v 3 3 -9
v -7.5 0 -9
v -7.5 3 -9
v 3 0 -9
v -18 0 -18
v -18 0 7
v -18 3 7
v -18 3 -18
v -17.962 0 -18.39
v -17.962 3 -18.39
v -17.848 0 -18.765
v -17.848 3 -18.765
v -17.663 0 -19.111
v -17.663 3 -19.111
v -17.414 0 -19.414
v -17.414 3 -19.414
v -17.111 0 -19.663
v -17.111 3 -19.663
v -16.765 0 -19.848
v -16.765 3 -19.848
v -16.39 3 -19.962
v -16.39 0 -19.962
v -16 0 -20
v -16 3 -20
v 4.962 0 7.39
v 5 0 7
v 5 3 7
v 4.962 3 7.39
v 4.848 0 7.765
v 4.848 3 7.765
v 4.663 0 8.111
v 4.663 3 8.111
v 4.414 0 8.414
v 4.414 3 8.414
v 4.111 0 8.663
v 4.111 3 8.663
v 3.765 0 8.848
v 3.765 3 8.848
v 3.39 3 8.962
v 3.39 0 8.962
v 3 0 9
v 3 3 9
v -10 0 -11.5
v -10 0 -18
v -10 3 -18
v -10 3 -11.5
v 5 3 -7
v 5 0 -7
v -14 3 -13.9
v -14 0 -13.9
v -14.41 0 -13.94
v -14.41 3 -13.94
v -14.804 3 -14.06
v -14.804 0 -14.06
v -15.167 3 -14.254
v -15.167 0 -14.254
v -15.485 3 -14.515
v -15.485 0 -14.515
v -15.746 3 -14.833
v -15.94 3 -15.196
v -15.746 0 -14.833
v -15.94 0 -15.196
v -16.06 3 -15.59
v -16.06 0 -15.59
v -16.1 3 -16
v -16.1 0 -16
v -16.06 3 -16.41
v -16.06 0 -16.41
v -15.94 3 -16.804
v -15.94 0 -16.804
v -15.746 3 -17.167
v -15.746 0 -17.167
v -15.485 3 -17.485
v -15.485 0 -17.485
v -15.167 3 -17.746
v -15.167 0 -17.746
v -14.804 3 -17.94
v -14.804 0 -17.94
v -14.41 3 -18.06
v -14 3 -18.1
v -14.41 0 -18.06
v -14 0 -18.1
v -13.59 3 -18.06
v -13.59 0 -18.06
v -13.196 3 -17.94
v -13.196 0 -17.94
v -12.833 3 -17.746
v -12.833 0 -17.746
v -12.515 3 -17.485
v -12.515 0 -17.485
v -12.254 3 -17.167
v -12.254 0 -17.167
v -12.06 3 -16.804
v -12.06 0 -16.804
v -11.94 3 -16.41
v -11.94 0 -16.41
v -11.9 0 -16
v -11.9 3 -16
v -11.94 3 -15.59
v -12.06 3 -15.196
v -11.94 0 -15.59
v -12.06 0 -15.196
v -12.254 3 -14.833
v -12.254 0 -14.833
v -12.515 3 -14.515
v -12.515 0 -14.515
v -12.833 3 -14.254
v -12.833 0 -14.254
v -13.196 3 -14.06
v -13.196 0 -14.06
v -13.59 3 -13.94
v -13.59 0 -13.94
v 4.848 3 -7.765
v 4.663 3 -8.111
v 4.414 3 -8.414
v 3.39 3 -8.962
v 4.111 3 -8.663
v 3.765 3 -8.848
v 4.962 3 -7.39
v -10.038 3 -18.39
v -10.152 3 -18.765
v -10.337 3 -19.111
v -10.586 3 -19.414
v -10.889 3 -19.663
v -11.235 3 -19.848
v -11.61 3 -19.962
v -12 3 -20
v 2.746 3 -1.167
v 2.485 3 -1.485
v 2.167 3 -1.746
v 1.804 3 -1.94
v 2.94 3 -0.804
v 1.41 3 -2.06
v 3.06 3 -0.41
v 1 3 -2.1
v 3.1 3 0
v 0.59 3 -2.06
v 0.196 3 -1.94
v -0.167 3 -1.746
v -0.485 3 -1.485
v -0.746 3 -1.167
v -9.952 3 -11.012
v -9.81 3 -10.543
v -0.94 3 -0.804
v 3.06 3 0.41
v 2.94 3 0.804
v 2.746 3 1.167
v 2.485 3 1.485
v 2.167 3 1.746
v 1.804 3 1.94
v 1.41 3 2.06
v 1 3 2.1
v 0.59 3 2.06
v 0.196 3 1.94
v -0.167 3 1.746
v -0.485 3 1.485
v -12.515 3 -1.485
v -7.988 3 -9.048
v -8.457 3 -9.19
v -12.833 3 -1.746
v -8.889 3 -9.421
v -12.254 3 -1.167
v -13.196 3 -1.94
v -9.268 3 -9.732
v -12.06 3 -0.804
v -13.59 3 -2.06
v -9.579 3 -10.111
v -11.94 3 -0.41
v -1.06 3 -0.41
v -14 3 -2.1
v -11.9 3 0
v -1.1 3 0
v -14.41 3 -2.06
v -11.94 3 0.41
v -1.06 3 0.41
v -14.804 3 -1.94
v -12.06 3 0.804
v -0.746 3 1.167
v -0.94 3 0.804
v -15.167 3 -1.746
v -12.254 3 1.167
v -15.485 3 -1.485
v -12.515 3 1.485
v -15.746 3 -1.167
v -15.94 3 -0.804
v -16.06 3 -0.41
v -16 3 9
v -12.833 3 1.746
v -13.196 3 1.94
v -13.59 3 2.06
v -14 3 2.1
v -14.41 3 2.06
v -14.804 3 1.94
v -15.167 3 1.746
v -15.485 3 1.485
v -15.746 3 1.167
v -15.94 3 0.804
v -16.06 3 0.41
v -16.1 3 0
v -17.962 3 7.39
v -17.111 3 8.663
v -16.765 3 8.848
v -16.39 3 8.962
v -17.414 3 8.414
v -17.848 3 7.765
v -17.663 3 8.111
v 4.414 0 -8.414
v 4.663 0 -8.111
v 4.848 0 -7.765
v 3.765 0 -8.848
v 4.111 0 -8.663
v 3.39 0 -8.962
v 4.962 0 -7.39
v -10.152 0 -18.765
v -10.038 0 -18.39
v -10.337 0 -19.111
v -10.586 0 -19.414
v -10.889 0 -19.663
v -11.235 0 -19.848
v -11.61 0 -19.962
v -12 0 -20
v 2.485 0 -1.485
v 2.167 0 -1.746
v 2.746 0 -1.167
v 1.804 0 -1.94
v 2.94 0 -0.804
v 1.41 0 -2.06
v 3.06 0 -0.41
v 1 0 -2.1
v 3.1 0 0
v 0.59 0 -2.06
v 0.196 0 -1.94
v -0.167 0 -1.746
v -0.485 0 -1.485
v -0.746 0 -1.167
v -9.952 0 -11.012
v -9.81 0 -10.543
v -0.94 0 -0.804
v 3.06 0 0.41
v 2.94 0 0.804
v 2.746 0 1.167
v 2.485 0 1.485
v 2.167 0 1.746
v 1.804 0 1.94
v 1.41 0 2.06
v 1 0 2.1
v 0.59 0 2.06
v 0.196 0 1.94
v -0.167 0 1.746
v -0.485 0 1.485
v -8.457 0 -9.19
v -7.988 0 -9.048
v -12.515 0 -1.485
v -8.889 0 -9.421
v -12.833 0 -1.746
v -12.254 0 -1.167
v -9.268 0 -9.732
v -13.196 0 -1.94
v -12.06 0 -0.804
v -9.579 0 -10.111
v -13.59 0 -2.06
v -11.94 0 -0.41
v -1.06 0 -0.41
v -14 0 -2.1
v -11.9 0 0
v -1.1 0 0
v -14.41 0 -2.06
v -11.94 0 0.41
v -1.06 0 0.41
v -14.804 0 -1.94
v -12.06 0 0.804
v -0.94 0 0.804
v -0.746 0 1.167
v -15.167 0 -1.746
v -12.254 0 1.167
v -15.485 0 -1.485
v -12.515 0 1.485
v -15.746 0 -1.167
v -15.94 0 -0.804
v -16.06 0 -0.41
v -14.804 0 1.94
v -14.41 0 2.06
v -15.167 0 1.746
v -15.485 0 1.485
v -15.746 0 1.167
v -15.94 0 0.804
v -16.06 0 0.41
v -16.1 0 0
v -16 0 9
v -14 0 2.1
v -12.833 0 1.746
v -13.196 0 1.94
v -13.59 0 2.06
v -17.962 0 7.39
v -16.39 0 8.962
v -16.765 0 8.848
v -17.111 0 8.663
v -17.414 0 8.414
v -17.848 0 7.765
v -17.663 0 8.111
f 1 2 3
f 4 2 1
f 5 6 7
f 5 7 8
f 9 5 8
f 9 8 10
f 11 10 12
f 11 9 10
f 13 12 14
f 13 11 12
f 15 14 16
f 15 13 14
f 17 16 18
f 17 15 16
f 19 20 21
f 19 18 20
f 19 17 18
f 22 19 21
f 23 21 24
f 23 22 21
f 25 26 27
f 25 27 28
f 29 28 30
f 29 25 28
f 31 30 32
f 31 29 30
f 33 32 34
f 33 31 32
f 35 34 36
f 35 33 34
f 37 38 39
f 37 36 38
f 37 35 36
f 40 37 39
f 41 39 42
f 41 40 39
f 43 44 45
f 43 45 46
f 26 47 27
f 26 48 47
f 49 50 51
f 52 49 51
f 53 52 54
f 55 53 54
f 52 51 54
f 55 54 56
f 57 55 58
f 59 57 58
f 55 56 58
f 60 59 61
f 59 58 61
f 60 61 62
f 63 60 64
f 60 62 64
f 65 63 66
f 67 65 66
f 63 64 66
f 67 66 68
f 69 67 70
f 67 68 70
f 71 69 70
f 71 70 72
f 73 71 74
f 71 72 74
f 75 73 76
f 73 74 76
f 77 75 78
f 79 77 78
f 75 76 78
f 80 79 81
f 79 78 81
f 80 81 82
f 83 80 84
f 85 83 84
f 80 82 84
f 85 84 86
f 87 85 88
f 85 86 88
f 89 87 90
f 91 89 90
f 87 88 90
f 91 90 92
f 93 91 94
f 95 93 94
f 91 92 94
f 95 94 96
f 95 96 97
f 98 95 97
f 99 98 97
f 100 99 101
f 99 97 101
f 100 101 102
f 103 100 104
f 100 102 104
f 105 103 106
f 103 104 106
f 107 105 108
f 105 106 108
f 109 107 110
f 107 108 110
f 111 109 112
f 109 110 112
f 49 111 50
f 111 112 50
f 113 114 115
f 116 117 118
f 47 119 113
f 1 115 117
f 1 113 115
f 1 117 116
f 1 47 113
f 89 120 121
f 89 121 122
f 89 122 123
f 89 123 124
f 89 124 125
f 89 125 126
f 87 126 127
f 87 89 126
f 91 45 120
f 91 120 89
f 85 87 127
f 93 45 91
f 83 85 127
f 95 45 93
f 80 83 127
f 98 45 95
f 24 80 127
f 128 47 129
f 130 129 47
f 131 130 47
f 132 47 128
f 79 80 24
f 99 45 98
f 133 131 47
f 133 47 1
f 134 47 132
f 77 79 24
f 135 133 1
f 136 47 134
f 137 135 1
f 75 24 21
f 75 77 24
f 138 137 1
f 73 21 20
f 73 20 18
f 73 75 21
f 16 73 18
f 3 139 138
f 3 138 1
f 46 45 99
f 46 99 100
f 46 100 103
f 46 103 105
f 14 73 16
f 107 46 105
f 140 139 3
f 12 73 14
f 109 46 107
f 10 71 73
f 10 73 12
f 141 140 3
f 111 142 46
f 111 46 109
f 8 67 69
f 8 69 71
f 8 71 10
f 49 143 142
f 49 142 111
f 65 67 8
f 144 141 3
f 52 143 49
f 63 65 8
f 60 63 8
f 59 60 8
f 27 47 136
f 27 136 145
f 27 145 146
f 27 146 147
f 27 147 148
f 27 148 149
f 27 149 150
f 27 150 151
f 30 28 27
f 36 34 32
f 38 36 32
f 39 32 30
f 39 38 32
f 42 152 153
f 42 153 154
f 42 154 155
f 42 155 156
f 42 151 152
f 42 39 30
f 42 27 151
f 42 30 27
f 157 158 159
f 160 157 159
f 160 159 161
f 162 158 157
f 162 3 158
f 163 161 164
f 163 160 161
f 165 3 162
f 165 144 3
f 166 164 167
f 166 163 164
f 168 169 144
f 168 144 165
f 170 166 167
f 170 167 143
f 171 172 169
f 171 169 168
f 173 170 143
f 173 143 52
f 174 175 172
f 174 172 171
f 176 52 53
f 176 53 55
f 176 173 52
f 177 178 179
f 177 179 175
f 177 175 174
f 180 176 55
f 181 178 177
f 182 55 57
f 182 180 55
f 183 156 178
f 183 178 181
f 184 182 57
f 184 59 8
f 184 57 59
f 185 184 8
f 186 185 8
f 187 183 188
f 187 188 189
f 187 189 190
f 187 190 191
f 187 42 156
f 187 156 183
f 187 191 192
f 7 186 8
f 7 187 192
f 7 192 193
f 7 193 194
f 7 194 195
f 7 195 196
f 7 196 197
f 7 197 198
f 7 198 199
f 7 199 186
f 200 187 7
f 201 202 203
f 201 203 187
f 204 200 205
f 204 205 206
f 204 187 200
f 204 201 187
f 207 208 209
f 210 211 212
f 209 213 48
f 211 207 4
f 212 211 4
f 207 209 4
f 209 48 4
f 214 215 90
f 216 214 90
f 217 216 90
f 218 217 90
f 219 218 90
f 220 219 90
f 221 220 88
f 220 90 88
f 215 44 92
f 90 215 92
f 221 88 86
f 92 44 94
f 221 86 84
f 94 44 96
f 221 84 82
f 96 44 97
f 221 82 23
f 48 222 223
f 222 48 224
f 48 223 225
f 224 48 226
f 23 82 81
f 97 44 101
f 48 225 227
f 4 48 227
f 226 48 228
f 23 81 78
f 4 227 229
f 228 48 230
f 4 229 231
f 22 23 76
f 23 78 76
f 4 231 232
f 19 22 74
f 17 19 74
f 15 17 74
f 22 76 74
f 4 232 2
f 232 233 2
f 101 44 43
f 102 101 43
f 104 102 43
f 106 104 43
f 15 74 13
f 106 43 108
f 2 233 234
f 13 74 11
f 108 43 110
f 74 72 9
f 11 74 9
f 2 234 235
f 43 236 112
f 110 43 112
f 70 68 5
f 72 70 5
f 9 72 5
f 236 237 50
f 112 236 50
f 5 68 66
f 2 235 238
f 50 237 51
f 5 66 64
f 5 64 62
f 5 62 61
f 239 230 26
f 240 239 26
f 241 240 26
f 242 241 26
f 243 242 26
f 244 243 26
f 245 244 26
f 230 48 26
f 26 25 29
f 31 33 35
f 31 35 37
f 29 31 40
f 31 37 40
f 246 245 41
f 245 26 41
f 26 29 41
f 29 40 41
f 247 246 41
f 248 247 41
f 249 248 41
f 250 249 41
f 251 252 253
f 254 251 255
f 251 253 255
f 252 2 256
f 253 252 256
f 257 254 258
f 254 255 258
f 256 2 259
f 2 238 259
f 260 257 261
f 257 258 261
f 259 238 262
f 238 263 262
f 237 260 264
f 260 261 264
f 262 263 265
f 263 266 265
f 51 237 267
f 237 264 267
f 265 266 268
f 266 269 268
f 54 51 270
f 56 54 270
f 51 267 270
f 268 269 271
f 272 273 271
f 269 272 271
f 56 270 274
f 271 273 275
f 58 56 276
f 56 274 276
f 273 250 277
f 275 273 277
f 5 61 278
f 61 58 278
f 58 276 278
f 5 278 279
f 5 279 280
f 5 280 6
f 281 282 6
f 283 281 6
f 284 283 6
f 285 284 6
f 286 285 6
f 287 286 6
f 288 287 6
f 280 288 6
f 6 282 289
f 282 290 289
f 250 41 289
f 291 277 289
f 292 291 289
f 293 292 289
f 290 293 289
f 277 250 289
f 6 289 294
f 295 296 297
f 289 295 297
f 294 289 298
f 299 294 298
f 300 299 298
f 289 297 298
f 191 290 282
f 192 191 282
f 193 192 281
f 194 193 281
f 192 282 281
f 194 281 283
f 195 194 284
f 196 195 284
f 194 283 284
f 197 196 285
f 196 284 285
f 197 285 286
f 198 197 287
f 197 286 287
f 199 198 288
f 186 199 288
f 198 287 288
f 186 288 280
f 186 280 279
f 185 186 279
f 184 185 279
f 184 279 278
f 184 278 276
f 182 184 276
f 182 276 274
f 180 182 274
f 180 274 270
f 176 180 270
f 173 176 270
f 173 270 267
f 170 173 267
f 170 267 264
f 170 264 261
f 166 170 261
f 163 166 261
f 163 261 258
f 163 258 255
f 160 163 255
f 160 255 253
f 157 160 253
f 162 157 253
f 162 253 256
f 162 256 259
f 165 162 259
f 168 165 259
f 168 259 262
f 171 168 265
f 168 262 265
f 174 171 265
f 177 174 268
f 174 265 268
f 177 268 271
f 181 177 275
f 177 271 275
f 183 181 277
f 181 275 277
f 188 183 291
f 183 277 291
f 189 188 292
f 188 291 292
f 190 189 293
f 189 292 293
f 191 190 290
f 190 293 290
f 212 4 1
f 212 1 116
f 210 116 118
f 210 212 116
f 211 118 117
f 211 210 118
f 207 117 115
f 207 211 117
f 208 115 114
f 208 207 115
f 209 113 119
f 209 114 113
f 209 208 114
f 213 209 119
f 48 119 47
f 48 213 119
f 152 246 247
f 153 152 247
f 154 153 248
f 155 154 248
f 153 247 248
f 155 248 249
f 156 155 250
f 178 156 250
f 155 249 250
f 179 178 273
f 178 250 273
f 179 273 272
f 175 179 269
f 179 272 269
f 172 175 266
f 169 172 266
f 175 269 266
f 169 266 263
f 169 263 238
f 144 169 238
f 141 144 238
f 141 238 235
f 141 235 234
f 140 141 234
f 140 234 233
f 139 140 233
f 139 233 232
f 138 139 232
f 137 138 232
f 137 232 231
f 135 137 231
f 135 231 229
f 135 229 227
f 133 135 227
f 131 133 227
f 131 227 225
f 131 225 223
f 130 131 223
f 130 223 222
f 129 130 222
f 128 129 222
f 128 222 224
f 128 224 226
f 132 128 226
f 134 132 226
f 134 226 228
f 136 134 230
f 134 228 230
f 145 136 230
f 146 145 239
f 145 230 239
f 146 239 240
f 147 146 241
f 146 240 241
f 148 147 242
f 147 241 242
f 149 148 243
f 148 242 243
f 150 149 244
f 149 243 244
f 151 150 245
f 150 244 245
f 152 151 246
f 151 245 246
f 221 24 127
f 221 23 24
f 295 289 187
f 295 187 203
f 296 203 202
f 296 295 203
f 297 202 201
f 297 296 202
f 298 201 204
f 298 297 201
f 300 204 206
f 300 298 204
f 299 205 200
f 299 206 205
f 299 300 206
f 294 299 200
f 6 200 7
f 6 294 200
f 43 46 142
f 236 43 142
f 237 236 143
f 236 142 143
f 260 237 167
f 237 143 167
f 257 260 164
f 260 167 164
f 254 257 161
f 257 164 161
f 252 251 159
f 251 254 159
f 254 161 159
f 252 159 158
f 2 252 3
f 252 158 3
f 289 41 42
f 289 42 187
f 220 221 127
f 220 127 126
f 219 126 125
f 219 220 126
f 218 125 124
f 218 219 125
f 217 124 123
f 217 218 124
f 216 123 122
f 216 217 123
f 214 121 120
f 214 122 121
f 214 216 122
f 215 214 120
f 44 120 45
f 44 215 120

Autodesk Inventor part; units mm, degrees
ref_plane "YZ Plane" through (0, 0, 0) normal (1, 0, 0) x (0, 1, 0)
ref_plane "XZ Plane" through (0, 0, 0) normal (0, 1, 0) x (-1, 0, 0)
ref_plane "XY Plane" through (0, 0, 0) normal (0, 0, 1) x (1, 0, 0)
sketch "スケッチ1" plane through (0, 0, 0) normal (0, 1, 0) x (-1, 0, 0)
  line L0 (-3, 9) -> (16, 9)
  line L1 (10, -9) -> (-3, -9)
  line L2 (-5, -7) -> (-5, 7)
  line L3 (16, -20) -> (12, -20)
  line L4 (10, -18) -> (10, -9)
  arc A0 (16, -20) -> (18, -18) centre (16, -18) ccw
  arc A1 (10, -18) -> (12, -20) centre (12, -18) ccw
  arc A2 (-5, -7) -> (-3, -9) centre (-3, -7) ccw
  arc A3 (-3, 9) -> (-5, 7) centre (-3, 7) ccw
  line L5 (18, 7) -> (18, -18)
  arc A4 (18, 7) -> (16, 9) centre (16, 7) ccw
  point P0 (0, 0)
  point P1 (-5, 9)
  point P2 (-5, -9)
  point P3 (18, -20)
  point P4 (10, -20)
  point P5 (10, 9)
  point P6 (18, 9)
  dimension "d0" = 5
  dimension "d4" = 18
  dimension "d5" = 9
  dimension "d7" = 20
  dimension "d8" = 10
  dimension "d40" = 2
extrude "プレート1" add sketch "スケッチ1" along normal blind 3
sketch "スケッチ3" plane through (0, 3, 0) normal (0, 1, 0) x (1, 0, 0)
  line L0 (-10, 18) -> (-10, 9) projected
  line L1 (-16, 20) -> (-12, 20) projected
  line L2 (-18, -7) -> (-18, 18) projected
  line L3 (-10, 9) -> (3, 9) projected
  line L4 (3, -9) -> (-16, -9) projected
  point P0 (-14, 16)
  point P1 (-14, 0)
  dimension "d42" = 4
  dimension "d43" = 4
  dimension "d44" = 4
  dimension "d45" = 18
  dimension "d46" = 9
hole "穴3" at (1, 3, 0) direction (0, -1, 0) diameter 4.2 end through all
sketch "スケッチ2" plane through (0, 0, 0) normal (0, -1, 0) x (1, 0, 0)
  circle A0 centre (1, 0) radius 2.1 projected
  line L0 (3, 9) -> (-16, 9) projected
  arc A1 (-18, -18) -> (-16, -20) centre (-16, -18) ccw projected
  line L1 (-16, -20) -> (-12, -20) projected
  arc A2 (-12, -20) -> (-10, -18) centre (-12, -18) ccw projected
  line L2 (-10, -18) -> (-10, -9) projected
  line L3 (-10, -9) -> (3, -9) projected
  arc A3 (3, -9) -> (5, -7) centre (3, -7) ccw projected
  line L4 (5, -7) -> (5, 7) projected
  arc A4 (5, 7) -> (3, 9) centre (3, 7) ccw projected
  line L5 (-18, 7) -> (-18, -18) projected
  arc A5 (-16, 9) -> (-18, 7) centre (-16, 7) ccw projected
  point P0 (0, 0)
fillet "フィレット1" radius 2.5 1 edges at (-10, 1.5, -9)
hole "穴4" at (-14, 3, -16) at (-14, 3, 0) direction (0, -1, 0) diameter 4.2 end through all
equation "\"d5\" = 0.5 * d4"
equation "\"d7\" = 0.5 * d6"
equation "\"d44\" = d43"
equation "\"d37\" = Thickness"
equation "\"d52\" = Thickness"
equation "\"d9\" = Thickness"
equation "\"BendRadius\" = Thickness"
equation "\"BendReliefWidth\" = Thickness"
equation "\"BendReliefDepth\" = 0.5 * Thickness"
equation "\"CornerReliefSize\" = 4 * Thickness"
equation "\"MinimumRemnant\" = 2 * Thickness"
equation "\"TransitionRadius\" = BendRadius"
equation "\"JacobiRadiusSize\" = BendRadius"
equation "\"GapSize\" = Thickness"
equation "\"Thickness\" = 3"
equation "\"d6\" = 40"
properties part number "L_almite_braket"
